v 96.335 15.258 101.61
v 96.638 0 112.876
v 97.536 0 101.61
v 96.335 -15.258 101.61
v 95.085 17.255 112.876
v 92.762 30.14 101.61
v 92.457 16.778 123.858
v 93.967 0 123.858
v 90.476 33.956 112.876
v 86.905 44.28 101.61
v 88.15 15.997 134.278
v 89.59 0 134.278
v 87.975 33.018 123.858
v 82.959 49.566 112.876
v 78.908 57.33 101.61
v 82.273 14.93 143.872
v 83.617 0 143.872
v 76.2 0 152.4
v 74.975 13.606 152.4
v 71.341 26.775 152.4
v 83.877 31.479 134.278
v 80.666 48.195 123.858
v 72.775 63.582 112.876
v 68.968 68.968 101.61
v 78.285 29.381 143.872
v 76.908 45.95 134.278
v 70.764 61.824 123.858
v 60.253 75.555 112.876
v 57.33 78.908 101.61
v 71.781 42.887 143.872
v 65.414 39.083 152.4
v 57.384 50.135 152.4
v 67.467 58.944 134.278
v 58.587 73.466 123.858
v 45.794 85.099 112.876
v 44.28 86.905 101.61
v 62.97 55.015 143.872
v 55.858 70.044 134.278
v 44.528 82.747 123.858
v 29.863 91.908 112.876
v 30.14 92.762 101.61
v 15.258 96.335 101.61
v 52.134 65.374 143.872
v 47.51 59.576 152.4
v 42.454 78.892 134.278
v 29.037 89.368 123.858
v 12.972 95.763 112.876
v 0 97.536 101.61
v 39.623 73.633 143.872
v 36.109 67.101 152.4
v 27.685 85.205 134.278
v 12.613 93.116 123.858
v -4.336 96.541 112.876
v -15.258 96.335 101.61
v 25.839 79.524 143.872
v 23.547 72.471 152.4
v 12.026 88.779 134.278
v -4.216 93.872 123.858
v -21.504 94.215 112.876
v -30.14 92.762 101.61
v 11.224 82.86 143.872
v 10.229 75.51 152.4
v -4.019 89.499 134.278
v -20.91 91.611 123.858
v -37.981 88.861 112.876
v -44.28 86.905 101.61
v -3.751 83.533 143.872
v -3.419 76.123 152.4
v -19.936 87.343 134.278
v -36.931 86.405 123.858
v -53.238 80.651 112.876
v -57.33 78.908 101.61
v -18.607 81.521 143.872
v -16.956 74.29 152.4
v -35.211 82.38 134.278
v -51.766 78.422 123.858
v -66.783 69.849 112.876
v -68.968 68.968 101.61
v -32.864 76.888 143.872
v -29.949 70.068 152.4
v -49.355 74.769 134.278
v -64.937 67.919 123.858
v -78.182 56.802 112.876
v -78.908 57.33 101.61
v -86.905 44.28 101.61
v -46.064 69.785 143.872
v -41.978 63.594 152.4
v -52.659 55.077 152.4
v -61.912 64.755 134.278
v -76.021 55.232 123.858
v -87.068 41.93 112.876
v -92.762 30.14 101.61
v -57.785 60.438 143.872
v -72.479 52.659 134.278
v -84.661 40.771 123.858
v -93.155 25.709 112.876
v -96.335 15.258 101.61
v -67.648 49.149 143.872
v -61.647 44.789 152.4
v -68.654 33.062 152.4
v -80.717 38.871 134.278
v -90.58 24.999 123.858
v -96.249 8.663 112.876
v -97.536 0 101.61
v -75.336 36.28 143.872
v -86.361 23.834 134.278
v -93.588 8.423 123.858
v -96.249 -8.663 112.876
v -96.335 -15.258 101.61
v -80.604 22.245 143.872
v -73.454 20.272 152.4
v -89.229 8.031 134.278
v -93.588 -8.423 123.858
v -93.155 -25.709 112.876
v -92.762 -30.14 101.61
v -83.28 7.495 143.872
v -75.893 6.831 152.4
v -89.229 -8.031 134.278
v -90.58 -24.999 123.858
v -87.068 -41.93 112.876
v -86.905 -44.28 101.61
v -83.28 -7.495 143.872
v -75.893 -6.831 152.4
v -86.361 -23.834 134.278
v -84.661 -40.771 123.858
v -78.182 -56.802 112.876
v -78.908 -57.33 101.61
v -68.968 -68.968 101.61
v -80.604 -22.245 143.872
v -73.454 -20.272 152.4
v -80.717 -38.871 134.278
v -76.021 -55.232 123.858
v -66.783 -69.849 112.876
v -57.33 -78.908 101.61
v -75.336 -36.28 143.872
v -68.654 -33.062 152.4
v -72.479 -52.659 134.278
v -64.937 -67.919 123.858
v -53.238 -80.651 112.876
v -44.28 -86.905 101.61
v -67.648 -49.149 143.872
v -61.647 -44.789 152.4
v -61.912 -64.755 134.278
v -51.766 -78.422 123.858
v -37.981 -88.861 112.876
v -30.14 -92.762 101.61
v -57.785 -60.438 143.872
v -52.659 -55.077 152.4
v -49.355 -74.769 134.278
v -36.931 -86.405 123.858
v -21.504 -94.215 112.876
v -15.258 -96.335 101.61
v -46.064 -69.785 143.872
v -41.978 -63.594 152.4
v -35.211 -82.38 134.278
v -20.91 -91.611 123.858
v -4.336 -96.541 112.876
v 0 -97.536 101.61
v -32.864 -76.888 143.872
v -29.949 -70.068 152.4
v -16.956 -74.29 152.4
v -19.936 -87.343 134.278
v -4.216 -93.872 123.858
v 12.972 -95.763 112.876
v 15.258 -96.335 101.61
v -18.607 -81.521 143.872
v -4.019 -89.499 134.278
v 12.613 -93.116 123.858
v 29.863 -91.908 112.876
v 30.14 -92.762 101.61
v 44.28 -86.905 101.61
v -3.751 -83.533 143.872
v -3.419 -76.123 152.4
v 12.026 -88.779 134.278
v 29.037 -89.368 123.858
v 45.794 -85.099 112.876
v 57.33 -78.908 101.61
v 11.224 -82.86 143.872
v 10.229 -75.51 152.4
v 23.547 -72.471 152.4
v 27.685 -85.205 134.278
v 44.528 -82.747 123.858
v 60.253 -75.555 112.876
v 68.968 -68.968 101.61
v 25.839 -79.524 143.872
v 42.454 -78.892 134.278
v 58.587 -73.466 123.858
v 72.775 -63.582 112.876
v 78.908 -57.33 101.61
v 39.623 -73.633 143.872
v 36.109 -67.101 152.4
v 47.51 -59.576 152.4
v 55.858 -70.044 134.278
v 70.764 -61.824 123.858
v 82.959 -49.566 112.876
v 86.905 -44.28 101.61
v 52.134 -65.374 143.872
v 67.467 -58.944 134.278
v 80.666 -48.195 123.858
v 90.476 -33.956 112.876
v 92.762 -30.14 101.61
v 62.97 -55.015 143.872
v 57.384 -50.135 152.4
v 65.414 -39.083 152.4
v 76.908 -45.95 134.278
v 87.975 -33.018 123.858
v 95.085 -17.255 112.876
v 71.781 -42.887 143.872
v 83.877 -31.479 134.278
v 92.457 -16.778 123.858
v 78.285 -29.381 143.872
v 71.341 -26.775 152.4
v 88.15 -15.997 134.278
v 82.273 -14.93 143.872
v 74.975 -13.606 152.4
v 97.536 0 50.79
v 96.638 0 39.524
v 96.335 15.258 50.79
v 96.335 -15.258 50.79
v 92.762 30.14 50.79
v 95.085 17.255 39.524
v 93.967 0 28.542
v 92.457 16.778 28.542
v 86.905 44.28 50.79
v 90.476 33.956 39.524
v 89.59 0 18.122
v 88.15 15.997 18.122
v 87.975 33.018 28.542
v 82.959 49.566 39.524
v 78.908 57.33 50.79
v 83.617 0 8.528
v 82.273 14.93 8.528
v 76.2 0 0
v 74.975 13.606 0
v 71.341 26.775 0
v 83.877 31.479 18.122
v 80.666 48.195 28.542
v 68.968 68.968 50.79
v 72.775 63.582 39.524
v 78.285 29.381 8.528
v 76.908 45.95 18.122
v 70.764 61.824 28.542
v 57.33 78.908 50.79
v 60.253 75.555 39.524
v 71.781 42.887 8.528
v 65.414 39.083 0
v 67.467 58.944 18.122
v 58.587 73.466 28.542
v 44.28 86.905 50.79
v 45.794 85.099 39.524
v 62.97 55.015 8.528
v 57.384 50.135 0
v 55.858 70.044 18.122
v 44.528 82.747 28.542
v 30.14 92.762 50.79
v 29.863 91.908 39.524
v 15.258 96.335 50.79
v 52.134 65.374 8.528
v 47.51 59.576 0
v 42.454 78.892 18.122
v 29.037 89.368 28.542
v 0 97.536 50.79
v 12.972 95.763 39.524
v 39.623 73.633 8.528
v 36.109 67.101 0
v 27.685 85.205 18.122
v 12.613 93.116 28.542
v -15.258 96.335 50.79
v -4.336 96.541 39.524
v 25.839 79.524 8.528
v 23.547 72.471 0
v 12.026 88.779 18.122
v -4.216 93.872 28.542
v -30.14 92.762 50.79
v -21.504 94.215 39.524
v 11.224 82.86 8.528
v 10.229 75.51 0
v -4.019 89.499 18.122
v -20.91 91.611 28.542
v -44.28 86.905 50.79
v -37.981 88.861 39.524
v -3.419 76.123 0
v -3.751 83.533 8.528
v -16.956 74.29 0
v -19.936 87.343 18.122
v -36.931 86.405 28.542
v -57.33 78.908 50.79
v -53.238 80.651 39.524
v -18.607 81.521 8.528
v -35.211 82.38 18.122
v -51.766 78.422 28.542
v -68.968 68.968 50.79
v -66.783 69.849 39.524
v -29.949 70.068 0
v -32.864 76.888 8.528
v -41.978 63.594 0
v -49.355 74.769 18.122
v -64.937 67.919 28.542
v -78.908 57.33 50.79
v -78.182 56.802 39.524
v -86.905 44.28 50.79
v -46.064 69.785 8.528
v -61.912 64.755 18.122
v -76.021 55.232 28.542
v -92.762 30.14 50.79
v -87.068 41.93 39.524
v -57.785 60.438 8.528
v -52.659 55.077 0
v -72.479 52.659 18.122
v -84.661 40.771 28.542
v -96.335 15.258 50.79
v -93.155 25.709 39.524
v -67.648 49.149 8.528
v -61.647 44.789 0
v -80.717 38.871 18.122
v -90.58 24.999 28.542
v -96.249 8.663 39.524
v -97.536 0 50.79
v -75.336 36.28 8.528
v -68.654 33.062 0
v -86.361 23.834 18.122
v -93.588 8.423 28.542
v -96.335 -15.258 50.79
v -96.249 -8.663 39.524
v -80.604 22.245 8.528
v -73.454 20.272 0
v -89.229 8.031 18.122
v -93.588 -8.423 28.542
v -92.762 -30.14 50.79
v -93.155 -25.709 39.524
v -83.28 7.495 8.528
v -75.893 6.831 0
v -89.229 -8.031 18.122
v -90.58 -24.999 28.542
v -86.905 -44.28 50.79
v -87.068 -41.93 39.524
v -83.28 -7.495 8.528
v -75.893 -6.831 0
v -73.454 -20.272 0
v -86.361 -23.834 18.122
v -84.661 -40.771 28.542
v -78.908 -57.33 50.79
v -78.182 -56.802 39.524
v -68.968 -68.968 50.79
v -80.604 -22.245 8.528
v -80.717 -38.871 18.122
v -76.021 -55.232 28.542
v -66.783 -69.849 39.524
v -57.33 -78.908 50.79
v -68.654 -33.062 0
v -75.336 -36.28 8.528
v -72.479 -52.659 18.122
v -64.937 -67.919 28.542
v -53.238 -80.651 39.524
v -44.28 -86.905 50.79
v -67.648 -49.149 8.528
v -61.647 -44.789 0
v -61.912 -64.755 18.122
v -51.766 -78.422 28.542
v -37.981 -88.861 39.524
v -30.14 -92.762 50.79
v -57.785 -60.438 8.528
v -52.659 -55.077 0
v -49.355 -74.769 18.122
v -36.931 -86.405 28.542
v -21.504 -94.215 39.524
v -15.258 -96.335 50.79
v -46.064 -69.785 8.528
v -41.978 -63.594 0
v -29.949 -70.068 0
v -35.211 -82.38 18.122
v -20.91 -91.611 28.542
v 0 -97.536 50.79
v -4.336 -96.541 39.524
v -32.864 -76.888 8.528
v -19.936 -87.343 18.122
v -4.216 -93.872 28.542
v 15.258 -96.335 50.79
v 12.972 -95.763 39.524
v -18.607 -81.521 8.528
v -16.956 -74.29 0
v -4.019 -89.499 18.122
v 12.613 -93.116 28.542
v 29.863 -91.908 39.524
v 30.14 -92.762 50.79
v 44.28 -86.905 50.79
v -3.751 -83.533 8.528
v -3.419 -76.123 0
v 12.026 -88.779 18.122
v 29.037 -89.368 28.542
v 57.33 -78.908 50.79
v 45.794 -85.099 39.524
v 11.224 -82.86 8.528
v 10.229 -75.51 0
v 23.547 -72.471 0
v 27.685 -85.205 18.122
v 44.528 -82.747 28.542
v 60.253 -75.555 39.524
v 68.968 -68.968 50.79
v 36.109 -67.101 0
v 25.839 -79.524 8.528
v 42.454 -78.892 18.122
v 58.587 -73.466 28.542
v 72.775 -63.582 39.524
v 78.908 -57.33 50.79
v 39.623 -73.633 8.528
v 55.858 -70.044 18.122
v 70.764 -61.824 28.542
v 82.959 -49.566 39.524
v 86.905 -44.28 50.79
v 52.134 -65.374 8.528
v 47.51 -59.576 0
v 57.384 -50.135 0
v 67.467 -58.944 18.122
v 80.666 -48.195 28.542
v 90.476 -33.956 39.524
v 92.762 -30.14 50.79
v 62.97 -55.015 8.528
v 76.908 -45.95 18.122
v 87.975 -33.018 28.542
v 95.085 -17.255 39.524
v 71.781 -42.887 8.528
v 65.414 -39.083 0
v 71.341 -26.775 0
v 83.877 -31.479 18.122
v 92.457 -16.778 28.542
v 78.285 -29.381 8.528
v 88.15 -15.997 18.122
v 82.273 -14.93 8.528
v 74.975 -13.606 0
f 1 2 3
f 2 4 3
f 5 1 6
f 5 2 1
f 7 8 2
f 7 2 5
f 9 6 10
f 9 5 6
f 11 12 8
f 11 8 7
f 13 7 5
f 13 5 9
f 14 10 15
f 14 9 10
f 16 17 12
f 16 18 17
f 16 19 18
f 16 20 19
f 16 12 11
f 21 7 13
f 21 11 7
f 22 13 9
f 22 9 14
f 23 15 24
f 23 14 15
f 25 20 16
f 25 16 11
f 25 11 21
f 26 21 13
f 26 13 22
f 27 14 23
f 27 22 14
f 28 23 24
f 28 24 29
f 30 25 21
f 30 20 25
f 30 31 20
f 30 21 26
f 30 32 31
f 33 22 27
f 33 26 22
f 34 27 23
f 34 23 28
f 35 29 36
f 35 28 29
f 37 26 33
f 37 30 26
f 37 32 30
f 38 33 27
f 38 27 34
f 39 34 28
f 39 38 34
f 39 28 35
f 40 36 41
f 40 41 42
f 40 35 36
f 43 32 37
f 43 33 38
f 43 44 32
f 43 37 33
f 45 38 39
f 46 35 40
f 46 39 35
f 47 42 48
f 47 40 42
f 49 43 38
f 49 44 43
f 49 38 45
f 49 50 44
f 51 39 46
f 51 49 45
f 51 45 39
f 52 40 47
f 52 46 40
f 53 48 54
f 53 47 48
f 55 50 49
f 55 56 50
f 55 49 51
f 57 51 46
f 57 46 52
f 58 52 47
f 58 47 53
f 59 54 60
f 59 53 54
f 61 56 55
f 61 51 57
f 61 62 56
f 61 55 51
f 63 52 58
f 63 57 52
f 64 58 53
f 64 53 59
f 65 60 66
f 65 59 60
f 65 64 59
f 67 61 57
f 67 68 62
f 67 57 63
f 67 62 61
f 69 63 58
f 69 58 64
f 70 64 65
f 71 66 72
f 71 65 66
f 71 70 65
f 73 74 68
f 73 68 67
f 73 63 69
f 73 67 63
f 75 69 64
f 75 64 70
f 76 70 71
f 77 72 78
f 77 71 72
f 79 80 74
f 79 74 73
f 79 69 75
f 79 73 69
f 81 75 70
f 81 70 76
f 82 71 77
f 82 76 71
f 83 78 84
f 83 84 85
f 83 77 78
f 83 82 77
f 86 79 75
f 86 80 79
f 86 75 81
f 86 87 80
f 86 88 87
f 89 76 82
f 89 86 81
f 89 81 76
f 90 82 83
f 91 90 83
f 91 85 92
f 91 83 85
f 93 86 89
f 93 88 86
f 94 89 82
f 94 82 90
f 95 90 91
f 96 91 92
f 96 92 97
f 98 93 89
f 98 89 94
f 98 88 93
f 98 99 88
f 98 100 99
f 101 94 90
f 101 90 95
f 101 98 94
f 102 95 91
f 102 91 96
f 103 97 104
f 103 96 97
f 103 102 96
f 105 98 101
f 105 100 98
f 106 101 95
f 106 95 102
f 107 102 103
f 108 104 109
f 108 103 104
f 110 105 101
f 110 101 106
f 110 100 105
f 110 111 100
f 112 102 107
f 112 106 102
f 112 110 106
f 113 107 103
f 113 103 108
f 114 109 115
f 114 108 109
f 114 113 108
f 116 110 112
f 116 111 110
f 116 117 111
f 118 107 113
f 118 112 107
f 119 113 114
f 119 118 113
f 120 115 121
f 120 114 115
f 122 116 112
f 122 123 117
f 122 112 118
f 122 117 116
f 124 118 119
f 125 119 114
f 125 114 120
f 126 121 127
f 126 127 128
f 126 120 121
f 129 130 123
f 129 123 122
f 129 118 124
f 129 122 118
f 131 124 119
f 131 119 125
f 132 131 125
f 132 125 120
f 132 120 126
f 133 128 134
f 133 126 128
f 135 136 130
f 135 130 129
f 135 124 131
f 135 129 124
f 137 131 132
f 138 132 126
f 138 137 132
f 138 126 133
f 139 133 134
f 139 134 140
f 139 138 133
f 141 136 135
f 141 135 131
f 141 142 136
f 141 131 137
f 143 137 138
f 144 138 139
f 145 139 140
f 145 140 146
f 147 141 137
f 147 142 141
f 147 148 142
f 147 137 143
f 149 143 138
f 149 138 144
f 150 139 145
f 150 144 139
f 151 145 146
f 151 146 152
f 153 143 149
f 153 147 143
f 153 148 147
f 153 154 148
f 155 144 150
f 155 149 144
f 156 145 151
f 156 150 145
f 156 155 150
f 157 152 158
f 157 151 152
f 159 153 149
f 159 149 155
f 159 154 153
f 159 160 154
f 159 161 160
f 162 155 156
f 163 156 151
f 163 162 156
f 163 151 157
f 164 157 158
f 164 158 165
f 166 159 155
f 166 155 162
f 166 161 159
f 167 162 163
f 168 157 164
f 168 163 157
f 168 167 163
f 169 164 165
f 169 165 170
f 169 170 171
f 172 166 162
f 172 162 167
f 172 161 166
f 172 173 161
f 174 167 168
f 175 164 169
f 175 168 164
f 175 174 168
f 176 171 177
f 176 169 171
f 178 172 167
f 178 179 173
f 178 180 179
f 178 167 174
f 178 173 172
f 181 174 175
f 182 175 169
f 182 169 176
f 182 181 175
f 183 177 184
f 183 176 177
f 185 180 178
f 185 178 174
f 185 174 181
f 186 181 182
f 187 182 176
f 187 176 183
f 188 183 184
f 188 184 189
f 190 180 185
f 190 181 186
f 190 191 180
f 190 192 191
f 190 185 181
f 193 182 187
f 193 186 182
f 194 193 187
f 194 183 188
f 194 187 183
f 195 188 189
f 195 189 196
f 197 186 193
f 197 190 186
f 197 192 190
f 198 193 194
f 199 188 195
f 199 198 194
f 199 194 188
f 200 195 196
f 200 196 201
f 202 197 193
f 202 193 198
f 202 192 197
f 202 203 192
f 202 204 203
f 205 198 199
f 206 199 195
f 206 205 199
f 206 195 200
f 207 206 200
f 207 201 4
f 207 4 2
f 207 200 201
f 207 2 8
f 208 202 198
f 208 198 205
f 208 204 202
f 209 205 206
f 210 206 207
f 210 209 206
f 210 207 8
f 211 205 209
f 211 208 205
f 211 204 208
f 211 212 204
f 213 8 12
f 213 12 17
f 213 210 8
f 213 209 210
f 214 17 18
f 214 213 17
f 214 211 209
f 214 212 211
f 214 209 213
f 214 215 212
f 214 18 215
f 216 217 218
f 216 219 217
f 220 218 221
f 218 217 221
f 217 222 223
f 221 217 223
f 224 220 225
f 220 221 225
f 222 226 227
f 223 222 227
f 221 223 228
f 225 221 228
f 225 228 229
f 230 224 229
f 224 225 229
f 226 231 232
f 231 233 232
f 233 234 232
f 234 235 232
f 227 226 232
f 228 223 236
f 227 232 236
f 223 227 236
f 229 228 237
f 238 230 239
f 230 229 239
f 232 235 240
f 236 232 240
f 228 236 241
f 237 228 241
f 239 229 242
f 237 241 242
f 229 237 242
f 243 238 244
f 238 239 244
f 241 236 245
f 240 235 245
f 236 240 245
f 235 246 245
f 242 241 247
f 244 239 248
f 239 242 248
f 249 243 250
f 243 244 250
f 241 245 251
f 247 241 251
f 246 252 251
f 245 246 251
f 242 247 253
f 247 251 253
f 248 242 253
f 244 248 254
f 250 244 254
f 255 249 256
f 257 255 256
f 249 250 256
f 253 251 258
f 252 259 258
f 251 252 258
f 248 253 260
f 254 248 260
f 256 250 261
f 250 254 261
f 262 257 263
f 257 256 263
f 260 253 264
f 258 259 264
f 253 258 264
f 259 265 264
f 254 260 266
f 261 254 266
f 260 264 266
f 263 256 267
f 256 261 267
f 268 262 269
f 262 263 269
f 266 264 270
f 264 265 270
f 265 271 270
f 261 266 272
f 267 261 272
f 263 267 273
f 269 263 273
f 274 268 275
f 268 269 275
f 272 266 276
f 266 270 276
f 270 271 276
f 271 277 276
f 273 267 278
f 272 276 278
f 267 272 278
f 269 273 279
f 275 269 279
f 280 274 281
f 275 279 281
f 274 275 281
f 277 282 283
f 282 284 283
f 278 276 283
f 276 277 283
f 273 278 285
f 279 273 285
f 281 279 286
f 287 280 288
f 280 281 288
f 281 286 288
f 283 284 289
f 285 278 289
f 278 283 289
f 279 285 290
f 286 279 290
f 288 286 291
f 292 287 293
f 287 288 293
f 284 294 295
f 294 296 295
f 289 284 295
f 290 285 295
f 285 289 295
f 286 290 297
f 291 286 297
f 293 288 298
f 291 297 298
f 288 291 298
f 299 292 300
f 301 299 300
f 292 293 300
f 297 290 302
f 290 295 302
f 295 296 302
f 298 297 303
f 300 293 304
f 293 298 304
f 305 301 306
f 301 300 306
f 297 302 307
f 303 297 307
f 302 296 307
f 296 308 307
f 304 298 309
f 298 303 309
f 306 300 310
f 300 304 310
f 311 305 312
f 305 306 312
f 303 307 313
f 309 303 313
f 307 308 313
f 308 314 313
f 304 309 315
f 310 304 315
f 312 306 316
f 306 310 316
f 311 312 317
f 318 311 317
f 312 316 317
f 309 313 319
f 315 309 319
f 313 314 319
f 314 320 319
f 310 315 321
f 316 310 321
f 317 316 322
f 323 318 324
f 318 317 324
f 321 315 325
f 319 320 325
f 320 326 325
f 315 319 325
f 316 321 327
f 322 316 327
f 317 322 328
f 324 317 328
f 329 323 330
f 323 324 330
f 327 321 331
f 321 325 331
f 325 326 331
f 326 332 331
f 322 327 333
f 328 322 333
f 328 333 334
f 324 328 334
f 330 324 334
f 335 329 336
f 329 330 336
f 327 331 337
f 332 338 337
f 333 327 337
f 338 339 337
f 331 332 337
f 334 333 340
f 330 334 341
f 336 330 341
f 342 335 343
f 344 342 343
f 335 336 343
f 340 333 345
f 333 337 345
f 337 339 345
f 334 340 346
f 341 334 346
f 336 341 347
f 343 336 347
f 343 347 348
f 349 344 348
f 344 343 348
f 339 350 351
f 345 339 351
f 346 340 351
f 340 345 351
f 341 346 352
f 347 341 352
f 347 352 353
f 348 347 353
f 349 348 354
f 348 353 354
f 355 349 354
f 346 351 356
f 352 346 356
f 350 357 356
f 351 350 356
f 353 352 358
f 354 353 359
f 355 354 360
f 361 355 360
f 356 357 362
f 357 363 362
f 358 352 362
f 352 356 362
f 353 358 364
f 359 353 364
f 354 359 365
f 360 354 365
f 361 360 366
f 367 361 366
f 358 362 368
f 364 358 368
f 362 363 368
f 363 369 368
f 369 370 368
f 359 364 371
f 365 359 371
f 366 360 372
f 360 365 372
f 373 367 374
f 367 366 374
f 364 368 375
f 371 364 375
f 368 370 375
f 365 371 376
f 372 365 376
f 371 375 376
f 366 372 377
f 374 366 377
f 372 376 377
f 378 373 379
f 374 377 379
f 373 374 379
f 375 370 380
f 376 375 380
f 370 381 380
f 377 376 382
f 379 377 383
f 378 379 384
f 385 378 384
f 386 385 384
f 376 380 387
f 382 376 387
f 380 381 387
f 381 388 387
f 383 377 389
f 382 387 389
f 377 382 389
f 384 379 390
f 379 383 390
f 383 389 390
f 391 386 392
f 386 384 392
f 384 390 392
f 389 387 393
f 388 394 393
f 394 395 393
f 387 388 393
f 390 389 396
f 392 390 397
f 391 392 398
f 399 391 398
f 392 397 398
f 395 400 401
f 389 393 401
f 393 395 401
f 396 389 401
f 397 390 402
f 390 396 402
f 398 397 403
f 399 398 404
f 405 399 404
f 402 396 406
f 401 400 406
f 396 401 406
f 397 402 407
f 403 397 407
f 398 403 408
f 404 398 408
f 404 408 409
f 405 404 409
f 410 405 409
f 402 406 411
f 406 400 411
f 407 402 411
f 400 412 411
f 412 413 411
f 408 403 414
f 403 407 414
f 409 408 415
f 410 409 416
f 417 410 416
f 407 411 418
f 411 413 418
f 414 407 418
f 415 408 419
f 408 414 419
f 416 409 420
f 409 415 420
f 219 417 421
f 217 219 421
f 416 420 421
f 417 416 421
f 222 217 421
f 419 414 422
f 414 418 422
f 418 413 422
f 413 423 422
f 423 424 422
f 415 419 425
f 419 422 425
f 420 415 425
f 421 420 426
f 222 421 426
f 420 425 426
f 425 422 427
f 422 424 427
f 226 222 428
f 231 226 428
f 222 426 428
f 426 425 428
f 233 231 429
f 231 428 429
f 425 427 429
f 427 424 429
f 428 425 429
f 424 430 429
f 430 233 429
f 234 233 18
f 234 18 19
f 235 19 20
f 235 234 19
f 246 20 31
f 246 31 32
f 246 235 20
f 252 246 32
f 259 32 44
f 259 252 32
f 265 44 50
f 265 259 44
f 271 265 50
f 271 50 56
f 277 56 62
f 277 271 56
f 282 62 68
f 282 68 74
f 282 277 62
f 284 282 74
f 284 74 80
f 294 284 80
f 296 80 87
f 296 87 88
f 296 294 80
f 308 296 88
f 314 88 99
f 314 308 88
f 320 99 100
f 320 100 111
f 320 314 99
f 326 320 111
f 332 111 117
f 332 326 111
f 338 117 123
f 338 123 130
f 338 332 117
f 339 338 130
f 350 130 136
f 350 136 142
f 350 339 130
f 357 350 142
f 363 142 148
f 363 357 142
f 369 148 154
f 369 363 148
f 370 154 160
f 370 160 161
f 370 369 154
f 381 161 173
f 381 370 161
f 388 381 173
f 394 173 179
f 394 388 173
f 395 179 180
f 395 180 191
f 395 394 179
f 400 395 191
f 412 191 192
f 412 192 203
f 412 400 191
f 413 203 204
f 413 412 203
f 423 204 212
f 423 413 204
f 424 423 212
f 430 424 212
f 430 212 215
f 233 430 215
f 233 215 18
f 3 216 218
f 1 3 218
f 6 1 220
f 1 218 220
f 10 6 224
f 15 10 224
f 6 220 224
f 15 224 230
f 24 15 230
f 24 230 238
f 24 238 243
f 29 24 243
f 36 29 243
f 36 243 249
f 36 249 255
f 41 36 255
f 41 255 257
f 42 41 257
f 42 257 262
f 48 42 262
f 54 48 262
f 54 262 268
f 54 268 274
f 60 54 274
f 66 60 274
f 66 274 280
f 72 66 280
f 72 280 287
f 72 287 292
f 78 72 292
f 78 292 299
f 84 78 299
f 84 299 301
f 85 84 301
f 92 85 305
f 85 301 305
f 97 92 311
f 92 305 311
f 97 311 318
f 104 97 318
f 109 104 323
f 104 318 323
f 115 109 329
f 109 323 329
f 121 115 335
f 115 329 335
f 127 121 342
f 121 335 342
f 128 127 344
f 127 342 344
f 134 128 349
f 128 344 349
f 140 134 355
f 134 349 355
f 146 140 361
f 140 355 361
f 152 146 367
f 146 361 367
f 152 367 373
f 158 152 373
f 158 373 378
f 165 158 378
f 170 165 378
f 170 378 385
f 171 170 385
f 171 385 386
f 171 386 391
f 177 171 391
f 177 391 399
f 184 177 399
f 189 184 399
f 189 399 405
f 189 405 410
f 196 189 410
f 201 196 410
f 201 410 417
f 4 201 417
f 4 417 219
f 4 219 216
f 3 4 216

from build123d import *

# Parameters (mm, degrees)
F0_R     = 97.536
F0_R_2   = 76.2
F1_DEPTH = 152.4


# Not quite as in the source:
# - a fillet or chamfer that OpenCascade refuses, or shapes differently, is made with other operations: its cross-section is extruded or revolved along the edge and cut away or added


with BuildPart() as f1:
    # F0 (on Top) → F1 (new body)
    with BuildSketch(Plane.XY):
        Circle(F0_R)
        Circle(F0_R_2, mode=Mode.SUBTRACT)
    extrude(amount=F1_DEPTH)

    # F2: fillet of radius 71.12 on 1 edges, made by hand

    # F2_s1 → F2_t2 (revolve, cut)
    with BuildSketch(Plane.XZ):
        with BuildLine():
            ThreePointArc((97.536, 101.6101610162), (91.9854001803, 129.1548185744), (76.2, 152.4))
            Line((76.2, 152.4), (97.536, 152.4))
            Line((97.536, 152.4), (97.536, 101.6101610162))
        make_face()
    revolve(axis=Axis((0, 0, 152.4), (0, 0, 1)), mode=Mode.SUBTRACT)

    # F3: fillet of radius 71.12 on 3 edges, made by hand

    # F3_s1 → F3_t2 (revolve, cut)
    with BuildSketch(Plane.XZ):
        with BuildLine():
            ThreePointArc((97.536, 50.7898389838), (91.9854001803, 23.2451814256), (76.2, 0))
            Line((76.2, 0), (97.536, 0))
            Line((97.536, 0), (97.536, 50.7898389838))
        make_face()
    revolve(axis=Axis((0, 0, 0), (0, 0, 1)), mode=Mode.SUBTRACT)


solid = f1.part
